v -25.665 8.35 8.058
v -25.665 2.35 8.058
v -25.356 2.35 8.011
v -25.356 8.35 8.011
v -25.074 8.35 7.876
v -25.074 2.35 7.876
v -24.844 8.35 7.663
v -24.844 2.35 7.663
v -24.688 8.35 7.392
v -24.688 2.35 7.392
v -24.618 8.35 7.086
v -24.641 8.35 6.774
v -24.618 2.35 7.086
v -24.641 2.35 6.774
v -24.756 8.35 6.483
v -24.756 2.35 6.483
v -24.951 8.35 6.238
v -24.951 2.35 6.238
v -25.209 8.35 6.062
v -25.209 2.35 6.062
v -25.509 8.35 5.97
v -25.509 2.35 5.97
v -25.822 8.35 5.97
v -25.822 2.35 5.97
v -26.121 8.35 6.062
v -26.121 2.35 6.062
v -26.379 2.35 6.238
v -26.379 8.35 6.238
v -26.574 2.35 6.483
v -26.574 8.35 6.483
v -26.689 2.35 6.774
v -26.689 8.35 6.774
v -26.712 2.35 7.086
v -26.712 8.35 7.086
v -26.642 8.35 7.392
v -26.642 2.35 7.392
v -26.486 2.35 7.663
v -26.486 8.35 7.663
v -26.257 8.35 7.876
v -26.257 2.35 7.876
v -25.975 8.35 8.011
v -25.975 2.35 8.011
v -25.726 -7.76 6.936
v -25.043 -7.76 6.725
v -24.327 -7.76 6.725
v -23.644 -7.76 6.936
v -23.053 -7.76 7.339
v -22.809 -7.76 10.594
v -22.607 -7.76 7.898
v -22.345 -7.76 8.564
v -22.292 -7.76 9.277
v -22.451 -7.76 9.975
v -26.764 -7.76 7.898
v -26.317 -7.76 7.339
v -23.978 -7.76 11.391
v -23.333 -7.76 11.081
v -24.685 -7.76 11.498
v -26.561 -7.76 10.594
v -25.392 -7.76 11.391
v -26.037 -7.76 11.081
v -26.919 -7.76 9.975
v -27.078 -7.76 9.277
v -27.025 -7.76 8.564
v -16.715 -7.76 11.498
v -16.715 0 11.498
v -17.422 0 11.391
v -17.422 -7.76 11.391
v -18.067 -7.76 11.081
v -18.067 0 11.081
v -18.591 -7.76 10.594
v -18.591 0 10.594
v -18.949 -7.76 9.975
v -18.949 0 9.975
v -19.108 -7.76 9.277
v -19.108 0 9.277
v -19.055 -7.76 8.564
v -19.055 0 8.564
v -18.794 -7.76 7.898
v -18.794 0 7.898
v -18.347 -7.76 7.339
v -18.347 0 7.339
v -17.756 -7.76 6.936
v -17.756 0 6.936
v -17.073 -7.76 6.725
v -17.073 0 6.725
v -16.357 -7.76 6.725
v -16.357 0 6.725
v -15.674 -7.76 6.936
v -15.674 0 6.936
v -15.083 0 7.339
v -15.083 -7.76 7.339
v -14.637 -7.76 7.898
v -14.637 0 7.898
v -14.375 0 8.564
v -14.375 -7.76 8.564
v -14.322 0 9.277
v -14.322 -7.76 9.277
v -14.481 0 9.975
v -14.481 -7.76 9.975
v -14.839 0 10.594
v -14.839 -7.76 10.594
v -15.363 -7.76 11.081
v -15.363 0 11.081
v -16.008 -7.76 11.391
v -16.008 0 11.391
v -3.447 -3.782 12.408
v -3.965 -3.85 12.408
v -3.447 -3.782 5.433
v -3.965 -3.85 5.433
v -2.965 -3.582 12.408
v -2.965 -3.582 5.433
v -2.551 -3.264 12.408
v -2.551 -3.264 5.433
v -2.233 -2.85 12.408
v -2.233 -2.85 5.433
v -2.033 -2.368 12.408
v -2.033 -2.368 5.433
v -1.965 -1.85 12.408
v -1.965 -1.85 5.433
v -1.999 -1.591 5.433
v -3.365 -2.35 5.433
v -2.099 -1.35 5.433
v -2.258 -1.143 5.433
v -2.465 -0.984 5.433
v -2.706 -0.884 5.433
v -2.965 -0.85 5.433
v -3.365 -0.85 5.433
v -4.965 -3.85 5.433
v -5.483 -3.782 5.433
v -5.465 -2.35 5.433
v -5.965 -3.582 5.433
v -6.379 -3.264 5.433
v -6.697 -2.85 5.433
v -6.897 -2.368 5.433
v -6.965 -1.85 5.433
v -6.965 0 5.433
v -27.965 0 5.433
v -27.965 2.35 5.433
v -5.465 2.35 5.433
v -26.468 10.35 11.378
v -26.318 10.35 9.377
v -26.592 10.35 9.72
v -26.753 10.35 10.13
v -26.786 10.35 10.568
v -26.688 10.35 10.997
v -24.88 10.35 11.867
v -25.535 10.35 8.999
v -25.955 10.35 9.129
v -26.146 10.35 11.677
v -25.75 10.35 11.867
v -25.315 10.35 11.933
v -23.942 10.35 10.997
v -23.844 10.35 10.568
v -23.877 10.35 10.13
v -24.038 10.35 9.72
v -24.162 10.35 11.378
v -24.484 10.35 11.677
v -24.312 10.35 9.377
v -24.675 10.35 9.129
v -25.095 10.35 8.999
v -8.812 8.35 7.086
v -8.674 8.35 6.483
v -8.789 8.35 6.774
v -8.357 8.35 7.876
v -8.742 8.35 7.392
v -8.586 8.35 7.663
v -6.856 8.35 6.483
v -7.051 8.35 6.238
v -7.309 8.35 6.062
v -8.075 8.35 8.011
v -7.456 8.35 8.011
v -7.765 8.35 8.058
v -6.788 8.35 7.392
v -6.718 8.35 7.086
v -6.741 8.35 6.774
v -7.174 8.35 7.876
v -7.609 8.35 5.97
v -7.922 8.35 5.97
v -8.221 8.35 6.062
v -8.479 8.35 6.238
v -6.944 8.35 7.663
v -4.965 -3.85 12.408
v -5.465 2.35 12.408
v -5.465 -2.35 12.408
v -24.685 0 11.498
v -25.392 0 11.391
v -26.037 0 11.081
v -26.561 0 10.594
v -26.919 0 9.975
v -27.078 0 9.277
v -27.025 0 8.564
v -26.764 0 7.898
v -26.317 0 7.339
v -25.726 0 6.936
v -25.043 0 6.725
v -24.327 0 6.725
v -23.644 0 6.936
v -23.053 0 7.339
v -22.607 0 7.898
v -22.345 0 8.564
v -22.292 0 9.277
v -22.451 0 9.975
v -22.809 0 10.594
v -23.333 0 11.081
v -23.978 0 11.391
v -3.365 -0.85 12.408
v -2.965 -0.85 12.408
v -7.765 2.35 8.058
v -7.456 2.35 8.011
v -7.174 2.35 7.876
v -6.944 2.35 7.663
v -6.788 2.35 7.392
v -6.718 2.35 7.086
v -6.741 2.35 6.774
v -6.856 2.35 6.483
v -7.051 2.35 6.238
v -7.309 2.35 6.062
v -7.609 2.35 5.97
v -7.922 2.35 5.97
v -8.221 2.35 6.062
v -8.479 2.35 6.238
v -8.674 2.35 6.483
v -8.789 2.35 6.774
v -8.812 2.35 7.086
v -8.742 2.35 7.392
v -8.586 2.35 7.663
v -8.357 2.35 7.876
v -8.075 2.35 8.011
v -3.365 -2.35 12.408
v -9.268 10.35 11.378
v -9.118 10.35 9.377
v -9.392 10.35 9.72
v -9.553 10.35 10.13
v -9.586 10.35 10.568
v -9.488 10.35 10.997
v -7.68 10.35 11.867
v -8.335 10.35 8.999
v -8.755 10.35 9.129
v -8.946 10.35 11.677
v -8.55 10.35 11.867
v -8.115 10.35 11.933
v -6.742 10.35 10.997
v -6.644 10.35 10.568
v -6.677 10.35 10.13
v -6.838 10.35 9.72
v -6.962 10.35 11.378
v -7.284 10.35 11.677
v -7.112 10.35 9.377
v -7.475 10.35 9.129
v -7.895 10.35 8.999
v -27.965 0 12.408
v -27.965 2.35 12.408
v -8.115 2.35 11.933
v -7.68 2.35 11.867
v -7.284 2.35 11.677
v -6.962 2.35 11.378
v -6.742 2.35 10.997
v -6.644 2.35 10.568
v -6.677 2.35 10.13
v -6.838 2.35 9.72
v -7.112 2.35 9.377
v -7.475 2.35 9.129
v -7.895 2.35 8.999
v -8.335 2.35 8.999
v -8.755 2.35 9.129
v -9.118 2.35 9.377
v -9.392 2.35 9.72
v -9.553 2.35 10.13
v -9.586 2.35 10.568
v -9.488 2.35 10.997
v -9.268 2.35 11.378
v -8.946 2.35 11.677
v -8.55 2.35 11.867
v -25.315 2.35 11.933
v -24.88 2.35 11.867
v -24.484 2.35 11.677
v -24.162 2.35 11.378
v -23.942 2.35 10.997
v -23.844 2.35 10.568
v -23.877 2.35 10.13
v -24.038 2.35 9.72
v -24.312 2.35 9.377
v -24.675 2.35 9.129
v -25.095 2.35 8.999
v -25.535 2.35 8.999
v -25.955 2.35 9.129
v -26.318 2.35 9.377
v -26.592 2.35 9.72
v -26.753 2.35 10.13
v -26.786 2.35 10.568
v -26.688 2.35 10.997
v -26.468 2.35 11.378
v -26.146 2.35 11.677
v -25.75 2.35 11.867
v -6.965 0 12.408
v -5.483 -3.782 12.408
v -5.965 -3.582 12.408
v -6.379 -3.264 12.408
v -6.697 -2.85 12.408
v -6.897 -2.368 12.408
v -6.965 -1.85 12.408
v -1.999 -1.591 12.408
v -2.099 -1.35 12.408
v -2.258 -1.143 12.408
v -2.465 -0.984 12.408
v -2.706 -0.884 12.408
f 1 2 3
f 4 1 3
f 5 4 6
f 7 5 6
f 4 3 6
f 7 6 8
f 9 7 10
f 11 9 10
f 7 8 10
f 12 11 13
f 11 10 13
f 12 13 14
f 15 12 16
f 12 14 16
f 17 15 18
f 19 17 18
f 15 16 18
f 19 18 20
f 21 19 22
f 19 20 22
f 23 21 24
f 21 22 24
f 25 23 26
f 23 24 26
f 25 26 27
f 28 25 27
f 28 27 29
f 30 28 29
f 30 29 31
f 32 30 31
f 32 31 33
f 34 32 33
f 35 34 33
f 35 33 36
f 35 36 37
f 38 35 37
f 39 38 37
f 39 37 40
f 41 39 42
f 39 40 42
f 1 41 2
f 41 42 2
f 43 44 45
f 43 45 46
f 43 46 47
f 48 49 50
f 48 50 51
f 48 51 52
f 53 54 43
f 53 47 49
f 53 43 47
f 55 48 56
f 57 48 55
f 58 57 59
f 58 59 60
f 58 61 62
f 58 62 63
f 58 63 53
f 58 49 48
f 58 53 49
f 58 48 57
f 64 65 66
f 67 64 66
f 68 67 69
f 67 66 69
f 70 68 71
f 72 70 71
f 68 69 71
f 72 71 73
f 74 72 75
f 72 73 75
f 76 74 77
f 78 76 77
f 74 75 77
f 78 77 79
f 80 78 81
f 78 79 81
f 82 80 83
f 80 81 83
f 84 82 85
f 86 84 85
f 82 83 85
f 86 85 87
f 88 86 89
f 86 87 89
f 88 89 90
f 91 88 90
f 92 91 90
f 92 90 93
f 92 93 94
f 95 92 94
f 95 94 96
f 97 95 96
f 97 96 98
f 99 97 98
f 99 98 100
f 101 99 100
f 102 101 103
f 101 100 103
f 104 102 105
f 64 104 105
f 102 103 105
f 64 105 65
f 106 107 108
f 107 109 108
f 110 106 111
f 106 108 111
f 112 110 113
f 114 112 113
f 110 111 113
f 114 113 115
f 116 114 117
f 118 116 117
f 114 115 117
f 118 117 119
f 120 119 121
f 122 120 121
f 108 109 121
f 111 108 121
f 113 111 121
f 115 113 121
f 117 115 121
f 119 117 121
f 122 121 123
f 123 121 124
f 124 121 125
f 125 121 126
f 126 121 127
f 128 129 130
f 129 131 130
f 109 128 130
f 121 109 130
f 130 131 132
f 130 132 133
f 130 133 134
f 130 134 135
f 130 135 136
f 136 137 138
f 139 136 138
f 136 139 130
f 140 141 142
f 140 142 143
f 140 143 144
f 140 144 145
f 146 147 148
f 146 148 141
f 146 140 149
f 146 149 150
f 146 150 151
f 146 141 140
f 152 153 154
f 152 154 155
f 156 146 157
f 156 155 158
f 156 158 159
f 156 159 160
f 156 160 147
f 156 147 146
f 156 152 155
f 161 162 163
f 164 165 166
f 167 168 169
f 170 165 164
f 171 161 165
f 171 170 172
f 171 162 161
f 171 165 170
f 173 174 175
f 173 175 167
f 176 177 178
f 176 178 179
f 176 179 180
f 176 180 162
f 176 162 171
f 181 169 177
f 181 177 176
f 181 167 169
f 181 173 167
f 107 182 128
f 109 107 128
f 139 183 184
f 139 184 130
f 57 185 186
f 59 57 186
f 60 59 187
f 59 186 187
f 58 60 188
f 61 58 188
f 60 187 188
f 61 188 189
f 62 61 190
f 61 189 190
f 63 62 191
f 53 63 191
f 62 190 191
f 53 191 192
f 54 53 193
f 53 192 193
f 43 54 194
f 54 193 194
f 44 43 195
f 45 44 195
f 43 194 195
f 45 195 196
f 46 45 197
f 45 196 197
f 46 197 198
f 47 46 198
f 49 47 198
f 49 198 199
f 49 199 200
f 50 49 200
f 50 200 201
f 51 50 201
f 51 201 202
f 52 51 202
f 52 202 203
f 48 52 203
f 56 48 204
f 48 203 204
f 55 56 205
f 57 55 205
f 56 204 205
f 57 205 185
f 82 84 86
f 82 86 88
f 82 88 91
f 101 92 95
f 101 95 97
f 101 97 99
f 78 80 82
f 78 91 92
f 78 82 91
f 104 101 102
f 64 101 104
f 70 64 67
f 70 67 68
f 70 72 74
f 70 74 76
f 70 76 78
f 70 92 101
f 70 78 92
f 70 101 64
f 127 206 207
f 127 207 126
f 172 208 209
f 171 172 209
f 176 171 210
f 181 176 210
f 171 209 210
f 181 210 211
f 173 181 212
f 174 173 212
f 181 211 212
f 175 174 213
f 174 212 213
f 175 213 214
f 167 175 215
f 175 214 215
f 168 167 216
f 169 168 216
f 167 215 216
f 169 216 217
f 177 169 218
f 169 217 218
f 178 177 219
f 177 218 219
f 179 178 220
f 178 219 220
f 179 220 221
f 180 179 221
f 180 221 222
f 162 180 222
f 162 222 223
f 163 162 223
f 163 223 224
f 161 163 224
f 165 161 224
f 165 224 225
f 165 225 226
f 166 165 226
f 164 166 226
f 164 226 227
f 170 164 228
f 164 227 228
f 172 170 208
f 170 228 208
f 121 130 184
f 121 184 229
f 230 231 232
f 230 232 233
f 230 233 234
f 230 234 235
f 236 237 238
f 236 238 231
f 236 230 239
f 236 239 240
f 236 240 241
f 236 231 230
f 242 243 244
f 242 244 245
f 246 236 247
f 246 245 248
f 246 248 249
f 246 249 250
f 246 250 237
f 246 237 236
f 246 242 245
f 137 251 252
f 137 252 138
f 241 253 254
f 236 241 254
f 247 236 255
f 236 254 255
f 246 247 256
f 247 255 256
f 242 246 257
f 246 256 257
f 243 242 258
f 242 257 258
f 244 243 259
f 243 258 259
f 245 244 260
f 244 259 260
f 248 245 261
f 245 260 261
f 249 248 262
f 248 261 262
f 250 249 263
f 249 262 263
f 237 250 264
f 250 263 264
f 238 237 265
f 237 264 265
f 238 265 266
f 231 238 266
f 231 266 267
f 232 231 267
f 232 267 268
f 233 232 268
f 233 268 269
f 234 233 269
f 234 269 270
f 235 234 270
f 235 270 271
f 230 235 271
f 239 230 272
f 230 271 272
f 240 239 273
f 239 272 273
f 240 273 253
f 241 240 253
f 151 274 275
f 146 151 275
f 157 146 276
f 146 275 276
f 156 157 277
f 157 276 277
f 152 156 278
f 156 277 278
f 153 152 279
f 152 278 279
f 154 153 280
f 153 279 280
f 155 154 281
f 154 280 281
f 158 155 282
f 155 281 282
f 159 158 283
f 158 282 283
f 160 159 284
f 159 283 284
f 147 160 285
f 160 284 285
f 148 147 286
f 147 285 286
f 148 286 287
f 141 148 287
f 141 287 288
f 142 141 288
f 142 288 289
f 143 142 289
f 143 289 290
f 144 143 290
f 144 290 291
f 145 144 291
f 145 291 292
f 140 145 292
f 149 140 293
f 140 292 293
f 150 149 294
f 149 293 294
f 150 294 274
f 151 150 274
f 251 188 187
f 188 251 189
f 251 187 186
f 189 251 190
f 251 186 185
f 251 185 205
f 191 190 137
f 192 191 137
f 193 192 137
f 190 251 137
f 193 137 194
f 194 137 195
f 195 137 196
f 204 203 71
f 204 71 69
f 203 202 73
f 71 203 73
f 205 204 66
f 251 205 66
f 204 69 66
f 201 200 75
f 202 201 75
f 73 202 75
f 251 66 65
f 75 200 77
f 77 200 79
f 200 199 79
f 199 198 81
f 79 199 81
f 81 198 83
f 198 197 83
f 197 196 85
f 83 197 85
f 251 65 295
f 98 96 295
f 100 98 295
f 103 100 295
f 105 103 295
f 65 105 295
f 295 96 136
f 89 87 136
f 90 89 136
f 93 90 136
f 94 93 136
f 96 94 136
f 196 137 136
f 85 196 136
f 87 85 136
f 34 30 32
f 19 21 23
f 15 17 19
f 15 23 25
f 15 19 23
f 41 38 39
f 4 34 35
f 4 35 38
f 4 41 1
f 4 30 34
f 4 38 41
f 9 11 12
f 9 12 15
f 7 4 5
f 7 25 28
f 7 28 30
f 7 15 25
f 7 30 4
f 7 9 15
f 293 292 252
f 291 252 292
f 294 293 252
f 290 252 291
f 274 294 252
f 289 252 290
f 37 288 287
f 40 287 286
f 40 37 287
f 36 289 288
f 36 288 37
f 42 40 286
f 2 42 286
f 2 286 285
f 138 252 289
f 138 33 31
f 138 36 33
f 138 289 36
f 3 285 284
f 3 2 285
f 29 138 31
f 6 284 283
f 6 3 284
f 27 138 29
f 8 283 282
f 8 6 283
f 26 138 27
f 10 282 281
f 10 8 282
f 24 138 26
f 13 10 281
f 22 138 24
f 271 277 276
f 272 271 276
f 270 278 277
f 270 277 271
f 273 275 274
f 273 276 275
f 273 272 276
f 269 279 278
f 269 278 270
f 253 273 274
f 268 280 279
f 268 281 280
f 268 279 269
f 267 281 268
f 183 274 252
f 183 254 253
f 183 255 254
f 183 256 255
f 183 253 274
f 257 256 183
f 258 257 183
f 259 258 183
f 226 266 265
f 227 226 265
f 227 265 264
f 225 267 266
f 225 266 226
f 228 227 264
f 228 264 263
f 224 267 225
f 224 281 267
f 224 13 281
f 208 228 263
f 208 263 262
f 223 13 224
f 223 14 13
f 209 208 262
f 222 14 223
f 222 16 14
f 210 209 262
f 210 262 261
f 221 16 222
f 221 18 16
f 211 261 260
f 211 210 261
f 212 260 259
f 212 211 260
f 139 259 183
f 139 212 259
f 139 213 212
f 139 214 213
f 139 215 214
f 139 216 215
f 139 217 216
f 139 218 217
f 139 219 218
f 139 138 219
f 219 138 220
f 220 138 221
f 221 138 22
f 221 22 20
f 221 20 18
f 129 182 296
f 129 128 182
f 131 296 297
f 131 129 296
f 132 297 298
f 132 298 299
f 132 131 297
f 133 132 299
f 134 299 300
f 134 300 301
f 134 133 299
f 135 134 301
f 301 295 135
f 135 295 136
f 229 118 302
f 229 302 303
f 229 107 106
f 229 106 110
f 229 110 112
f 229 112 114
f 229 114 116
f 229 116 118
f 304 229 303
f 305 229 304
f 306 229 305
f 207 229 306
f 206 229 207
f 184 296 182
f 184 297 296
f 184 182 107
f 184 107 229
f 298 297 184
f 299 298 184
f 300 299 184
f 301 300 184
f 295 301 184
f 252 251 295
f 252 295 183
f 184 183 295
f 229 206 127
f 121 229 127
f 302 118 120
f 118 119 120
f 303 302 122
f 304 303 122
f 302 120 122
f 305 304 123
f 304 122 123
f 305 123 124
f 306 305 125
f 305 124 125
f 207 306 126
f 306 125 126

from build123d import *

# Parameters (mm, degrees)
SKETCH1_W           = 22.5
SKETCH1_H           = 6.975
BOSS_EXTRUDE1_DEPTH = 2.35
SKETCH2_R           = 1.475
BOSS_EXTRUDE2_DEPTH = 8
SKETCH3_W           = 1.5
SKETCH3_H           = 6.975
BOSS_EXTRUDE3_DEPTH = 3.85
SKETCH4_W           = 6.975
SKETCH4_H           = 3
BOSS_EXTRUDE4_DEPTH = 3.5
SKETCH5_W           = 2.1
SKETCH5_H           = 6.975
CUT_EXTRUDE1_DEPTH  = 1.5
SKETCH6_R           = 1.05
BOSS_EXTRUDE5_DEPTH = 6
SKETCH7_R           = 2.4
BOSS_EXTRUDE9_DEPTH = 7.76
FILLET1_R           = 2
FILLET2_R           = 2
FILLET3_R           = 1


with BuildPart() as part:
    # Sketch1 → Boss-Extrude1 (new body)
    with BuildSketch(Plane(origin=(0, 0, 0), x_dir=(1, 0, 0), z_dir=(0, 1, 0))):
        with Locations((-16.71505467, -8.920455339)):
            Rectangle(SKETCH1_W, SKETCH1_H)
    extrude(amount=BOSS_EXTRUDE1_DEPTH)

    # Sketch2 → Boss-Extrude2 (add)
    with BuildSketch(Plane(origin=(0, 2.35, 0), x_dir=(1, 0, 0), z_dir=(0, 1, 0))):
        with Locations(Location((-25.31505467, -10.457955339, 0), (0, 0, 270))):
            Circle(SKETCH2_R)
        with Locations(Location((-8.11505467, -10.457955339, 0), (0, 0, 270))):
            Circle(SKETCH2_R)
    extrude(amount=BOSS_EXTRUDE2_DEPTH)

    # Sketch3 → Boss-Extrude3 (add)
    with BuildSketch(Plane(origin=(0, 0, 0), x_dir=(-1, 0, 0), z_dir=(0, -1, 0))):
        with Locations((6.21505467, -8.920455339)):
            Rectangle(SKETCH3_W, SKETCH3_H)
    extrude(amount=BOSS_EXTRUDE3_DEPTH)

    # Sketch4 → Boss-Extrude4 (add)
    with BuildSketch(Plane(origin=(-5.46505467, 0, 0), x_dir=(0, 0, -1), z_dir=(1, 0, 0))):
        with Locations((-8.920455339, -2.35)):
            Rectangle(SKETCH4_W, SKETCH4_H)
    extrude(amount=BOSS_EXTRUDE4_DEPTH)

    # Sketch5 → Cut-Extrude1 (cut)
    with BuildSketch(Plane(origin=(0, -0.85, 0), x_dir=(1, 0, 0), z_dir=(0, 1, 0))):
        with Locations((-4.41505467, -8.920455339)):
            Rectangle(SKETCH5_W, SKETCH5_H)
    extrude(amount=-CUT_EXTRUDE1_DEPTH, mode=Mode.SUBTRACT)

    # Sketch6 → Boss-Extrude5 (add)
    with BuildSketch(Plane(origin=(0, 2.35, 0), x_dir=(1, 0, 0), z_dir=(0, 1, 0))):
        with Locations(Location((-7.76505467, -7.007955339, 0), (0, 0, 270))):
            Circle(SKETCH6_R)
        with Locations(Location((-25.66505467, -7.007955339, 0), (0, 0, 270))):
            Circle(SKETCH6_R)
    extrude(amount=BOSS_EXTRUDE5_DEPTH)

    # Sketch7 → Boss-Extrude9 (add)
    with BuildSketch(Plane(origin=(0, 0, 0), x_dir=(-1, 0, 0), z_dir=(0, -1, 0))):
        with Locations(Location((16.71505467, -9.097955339, 0), (0, 0, 270))):
            Circle(SKETCH7_R)
        with Locations(Location((24.68505467, -9.097955339, 0), (0, 0, 270))):
            Circle(SKETCH7_R)
    extrude(amount=BOSS_EXTRUDE9_DEPTH)

    # Fillet1
    fillet1_edges = [part.edges().sort_by_distance(p)[0] for p in [
        (-6.96505467, -3.85, 8.920455339),
    ]]
    fillet(fillet1_edges, radius=FILLET1_R)

    # Fillet2
    fillet2_edges = [part.edges().sort_by_distance(p)[0] for p in [
        (-1.96505467, -3.85, 8.920455339),
    ]]
    fillet(fillet2_edges, radius=FILLET2_R)

    # Fillet3
    fillet3_edges = [part.edges().sort_by_distance(p)[0] for p in [
        (-1.96505467, -0.85, 8.920455339),
    ]]
    fillet(fillet3_edges, radius=FILLET3_R - 0.0001)  # a hair under: the kernel refuses the full size


solid = part.part
